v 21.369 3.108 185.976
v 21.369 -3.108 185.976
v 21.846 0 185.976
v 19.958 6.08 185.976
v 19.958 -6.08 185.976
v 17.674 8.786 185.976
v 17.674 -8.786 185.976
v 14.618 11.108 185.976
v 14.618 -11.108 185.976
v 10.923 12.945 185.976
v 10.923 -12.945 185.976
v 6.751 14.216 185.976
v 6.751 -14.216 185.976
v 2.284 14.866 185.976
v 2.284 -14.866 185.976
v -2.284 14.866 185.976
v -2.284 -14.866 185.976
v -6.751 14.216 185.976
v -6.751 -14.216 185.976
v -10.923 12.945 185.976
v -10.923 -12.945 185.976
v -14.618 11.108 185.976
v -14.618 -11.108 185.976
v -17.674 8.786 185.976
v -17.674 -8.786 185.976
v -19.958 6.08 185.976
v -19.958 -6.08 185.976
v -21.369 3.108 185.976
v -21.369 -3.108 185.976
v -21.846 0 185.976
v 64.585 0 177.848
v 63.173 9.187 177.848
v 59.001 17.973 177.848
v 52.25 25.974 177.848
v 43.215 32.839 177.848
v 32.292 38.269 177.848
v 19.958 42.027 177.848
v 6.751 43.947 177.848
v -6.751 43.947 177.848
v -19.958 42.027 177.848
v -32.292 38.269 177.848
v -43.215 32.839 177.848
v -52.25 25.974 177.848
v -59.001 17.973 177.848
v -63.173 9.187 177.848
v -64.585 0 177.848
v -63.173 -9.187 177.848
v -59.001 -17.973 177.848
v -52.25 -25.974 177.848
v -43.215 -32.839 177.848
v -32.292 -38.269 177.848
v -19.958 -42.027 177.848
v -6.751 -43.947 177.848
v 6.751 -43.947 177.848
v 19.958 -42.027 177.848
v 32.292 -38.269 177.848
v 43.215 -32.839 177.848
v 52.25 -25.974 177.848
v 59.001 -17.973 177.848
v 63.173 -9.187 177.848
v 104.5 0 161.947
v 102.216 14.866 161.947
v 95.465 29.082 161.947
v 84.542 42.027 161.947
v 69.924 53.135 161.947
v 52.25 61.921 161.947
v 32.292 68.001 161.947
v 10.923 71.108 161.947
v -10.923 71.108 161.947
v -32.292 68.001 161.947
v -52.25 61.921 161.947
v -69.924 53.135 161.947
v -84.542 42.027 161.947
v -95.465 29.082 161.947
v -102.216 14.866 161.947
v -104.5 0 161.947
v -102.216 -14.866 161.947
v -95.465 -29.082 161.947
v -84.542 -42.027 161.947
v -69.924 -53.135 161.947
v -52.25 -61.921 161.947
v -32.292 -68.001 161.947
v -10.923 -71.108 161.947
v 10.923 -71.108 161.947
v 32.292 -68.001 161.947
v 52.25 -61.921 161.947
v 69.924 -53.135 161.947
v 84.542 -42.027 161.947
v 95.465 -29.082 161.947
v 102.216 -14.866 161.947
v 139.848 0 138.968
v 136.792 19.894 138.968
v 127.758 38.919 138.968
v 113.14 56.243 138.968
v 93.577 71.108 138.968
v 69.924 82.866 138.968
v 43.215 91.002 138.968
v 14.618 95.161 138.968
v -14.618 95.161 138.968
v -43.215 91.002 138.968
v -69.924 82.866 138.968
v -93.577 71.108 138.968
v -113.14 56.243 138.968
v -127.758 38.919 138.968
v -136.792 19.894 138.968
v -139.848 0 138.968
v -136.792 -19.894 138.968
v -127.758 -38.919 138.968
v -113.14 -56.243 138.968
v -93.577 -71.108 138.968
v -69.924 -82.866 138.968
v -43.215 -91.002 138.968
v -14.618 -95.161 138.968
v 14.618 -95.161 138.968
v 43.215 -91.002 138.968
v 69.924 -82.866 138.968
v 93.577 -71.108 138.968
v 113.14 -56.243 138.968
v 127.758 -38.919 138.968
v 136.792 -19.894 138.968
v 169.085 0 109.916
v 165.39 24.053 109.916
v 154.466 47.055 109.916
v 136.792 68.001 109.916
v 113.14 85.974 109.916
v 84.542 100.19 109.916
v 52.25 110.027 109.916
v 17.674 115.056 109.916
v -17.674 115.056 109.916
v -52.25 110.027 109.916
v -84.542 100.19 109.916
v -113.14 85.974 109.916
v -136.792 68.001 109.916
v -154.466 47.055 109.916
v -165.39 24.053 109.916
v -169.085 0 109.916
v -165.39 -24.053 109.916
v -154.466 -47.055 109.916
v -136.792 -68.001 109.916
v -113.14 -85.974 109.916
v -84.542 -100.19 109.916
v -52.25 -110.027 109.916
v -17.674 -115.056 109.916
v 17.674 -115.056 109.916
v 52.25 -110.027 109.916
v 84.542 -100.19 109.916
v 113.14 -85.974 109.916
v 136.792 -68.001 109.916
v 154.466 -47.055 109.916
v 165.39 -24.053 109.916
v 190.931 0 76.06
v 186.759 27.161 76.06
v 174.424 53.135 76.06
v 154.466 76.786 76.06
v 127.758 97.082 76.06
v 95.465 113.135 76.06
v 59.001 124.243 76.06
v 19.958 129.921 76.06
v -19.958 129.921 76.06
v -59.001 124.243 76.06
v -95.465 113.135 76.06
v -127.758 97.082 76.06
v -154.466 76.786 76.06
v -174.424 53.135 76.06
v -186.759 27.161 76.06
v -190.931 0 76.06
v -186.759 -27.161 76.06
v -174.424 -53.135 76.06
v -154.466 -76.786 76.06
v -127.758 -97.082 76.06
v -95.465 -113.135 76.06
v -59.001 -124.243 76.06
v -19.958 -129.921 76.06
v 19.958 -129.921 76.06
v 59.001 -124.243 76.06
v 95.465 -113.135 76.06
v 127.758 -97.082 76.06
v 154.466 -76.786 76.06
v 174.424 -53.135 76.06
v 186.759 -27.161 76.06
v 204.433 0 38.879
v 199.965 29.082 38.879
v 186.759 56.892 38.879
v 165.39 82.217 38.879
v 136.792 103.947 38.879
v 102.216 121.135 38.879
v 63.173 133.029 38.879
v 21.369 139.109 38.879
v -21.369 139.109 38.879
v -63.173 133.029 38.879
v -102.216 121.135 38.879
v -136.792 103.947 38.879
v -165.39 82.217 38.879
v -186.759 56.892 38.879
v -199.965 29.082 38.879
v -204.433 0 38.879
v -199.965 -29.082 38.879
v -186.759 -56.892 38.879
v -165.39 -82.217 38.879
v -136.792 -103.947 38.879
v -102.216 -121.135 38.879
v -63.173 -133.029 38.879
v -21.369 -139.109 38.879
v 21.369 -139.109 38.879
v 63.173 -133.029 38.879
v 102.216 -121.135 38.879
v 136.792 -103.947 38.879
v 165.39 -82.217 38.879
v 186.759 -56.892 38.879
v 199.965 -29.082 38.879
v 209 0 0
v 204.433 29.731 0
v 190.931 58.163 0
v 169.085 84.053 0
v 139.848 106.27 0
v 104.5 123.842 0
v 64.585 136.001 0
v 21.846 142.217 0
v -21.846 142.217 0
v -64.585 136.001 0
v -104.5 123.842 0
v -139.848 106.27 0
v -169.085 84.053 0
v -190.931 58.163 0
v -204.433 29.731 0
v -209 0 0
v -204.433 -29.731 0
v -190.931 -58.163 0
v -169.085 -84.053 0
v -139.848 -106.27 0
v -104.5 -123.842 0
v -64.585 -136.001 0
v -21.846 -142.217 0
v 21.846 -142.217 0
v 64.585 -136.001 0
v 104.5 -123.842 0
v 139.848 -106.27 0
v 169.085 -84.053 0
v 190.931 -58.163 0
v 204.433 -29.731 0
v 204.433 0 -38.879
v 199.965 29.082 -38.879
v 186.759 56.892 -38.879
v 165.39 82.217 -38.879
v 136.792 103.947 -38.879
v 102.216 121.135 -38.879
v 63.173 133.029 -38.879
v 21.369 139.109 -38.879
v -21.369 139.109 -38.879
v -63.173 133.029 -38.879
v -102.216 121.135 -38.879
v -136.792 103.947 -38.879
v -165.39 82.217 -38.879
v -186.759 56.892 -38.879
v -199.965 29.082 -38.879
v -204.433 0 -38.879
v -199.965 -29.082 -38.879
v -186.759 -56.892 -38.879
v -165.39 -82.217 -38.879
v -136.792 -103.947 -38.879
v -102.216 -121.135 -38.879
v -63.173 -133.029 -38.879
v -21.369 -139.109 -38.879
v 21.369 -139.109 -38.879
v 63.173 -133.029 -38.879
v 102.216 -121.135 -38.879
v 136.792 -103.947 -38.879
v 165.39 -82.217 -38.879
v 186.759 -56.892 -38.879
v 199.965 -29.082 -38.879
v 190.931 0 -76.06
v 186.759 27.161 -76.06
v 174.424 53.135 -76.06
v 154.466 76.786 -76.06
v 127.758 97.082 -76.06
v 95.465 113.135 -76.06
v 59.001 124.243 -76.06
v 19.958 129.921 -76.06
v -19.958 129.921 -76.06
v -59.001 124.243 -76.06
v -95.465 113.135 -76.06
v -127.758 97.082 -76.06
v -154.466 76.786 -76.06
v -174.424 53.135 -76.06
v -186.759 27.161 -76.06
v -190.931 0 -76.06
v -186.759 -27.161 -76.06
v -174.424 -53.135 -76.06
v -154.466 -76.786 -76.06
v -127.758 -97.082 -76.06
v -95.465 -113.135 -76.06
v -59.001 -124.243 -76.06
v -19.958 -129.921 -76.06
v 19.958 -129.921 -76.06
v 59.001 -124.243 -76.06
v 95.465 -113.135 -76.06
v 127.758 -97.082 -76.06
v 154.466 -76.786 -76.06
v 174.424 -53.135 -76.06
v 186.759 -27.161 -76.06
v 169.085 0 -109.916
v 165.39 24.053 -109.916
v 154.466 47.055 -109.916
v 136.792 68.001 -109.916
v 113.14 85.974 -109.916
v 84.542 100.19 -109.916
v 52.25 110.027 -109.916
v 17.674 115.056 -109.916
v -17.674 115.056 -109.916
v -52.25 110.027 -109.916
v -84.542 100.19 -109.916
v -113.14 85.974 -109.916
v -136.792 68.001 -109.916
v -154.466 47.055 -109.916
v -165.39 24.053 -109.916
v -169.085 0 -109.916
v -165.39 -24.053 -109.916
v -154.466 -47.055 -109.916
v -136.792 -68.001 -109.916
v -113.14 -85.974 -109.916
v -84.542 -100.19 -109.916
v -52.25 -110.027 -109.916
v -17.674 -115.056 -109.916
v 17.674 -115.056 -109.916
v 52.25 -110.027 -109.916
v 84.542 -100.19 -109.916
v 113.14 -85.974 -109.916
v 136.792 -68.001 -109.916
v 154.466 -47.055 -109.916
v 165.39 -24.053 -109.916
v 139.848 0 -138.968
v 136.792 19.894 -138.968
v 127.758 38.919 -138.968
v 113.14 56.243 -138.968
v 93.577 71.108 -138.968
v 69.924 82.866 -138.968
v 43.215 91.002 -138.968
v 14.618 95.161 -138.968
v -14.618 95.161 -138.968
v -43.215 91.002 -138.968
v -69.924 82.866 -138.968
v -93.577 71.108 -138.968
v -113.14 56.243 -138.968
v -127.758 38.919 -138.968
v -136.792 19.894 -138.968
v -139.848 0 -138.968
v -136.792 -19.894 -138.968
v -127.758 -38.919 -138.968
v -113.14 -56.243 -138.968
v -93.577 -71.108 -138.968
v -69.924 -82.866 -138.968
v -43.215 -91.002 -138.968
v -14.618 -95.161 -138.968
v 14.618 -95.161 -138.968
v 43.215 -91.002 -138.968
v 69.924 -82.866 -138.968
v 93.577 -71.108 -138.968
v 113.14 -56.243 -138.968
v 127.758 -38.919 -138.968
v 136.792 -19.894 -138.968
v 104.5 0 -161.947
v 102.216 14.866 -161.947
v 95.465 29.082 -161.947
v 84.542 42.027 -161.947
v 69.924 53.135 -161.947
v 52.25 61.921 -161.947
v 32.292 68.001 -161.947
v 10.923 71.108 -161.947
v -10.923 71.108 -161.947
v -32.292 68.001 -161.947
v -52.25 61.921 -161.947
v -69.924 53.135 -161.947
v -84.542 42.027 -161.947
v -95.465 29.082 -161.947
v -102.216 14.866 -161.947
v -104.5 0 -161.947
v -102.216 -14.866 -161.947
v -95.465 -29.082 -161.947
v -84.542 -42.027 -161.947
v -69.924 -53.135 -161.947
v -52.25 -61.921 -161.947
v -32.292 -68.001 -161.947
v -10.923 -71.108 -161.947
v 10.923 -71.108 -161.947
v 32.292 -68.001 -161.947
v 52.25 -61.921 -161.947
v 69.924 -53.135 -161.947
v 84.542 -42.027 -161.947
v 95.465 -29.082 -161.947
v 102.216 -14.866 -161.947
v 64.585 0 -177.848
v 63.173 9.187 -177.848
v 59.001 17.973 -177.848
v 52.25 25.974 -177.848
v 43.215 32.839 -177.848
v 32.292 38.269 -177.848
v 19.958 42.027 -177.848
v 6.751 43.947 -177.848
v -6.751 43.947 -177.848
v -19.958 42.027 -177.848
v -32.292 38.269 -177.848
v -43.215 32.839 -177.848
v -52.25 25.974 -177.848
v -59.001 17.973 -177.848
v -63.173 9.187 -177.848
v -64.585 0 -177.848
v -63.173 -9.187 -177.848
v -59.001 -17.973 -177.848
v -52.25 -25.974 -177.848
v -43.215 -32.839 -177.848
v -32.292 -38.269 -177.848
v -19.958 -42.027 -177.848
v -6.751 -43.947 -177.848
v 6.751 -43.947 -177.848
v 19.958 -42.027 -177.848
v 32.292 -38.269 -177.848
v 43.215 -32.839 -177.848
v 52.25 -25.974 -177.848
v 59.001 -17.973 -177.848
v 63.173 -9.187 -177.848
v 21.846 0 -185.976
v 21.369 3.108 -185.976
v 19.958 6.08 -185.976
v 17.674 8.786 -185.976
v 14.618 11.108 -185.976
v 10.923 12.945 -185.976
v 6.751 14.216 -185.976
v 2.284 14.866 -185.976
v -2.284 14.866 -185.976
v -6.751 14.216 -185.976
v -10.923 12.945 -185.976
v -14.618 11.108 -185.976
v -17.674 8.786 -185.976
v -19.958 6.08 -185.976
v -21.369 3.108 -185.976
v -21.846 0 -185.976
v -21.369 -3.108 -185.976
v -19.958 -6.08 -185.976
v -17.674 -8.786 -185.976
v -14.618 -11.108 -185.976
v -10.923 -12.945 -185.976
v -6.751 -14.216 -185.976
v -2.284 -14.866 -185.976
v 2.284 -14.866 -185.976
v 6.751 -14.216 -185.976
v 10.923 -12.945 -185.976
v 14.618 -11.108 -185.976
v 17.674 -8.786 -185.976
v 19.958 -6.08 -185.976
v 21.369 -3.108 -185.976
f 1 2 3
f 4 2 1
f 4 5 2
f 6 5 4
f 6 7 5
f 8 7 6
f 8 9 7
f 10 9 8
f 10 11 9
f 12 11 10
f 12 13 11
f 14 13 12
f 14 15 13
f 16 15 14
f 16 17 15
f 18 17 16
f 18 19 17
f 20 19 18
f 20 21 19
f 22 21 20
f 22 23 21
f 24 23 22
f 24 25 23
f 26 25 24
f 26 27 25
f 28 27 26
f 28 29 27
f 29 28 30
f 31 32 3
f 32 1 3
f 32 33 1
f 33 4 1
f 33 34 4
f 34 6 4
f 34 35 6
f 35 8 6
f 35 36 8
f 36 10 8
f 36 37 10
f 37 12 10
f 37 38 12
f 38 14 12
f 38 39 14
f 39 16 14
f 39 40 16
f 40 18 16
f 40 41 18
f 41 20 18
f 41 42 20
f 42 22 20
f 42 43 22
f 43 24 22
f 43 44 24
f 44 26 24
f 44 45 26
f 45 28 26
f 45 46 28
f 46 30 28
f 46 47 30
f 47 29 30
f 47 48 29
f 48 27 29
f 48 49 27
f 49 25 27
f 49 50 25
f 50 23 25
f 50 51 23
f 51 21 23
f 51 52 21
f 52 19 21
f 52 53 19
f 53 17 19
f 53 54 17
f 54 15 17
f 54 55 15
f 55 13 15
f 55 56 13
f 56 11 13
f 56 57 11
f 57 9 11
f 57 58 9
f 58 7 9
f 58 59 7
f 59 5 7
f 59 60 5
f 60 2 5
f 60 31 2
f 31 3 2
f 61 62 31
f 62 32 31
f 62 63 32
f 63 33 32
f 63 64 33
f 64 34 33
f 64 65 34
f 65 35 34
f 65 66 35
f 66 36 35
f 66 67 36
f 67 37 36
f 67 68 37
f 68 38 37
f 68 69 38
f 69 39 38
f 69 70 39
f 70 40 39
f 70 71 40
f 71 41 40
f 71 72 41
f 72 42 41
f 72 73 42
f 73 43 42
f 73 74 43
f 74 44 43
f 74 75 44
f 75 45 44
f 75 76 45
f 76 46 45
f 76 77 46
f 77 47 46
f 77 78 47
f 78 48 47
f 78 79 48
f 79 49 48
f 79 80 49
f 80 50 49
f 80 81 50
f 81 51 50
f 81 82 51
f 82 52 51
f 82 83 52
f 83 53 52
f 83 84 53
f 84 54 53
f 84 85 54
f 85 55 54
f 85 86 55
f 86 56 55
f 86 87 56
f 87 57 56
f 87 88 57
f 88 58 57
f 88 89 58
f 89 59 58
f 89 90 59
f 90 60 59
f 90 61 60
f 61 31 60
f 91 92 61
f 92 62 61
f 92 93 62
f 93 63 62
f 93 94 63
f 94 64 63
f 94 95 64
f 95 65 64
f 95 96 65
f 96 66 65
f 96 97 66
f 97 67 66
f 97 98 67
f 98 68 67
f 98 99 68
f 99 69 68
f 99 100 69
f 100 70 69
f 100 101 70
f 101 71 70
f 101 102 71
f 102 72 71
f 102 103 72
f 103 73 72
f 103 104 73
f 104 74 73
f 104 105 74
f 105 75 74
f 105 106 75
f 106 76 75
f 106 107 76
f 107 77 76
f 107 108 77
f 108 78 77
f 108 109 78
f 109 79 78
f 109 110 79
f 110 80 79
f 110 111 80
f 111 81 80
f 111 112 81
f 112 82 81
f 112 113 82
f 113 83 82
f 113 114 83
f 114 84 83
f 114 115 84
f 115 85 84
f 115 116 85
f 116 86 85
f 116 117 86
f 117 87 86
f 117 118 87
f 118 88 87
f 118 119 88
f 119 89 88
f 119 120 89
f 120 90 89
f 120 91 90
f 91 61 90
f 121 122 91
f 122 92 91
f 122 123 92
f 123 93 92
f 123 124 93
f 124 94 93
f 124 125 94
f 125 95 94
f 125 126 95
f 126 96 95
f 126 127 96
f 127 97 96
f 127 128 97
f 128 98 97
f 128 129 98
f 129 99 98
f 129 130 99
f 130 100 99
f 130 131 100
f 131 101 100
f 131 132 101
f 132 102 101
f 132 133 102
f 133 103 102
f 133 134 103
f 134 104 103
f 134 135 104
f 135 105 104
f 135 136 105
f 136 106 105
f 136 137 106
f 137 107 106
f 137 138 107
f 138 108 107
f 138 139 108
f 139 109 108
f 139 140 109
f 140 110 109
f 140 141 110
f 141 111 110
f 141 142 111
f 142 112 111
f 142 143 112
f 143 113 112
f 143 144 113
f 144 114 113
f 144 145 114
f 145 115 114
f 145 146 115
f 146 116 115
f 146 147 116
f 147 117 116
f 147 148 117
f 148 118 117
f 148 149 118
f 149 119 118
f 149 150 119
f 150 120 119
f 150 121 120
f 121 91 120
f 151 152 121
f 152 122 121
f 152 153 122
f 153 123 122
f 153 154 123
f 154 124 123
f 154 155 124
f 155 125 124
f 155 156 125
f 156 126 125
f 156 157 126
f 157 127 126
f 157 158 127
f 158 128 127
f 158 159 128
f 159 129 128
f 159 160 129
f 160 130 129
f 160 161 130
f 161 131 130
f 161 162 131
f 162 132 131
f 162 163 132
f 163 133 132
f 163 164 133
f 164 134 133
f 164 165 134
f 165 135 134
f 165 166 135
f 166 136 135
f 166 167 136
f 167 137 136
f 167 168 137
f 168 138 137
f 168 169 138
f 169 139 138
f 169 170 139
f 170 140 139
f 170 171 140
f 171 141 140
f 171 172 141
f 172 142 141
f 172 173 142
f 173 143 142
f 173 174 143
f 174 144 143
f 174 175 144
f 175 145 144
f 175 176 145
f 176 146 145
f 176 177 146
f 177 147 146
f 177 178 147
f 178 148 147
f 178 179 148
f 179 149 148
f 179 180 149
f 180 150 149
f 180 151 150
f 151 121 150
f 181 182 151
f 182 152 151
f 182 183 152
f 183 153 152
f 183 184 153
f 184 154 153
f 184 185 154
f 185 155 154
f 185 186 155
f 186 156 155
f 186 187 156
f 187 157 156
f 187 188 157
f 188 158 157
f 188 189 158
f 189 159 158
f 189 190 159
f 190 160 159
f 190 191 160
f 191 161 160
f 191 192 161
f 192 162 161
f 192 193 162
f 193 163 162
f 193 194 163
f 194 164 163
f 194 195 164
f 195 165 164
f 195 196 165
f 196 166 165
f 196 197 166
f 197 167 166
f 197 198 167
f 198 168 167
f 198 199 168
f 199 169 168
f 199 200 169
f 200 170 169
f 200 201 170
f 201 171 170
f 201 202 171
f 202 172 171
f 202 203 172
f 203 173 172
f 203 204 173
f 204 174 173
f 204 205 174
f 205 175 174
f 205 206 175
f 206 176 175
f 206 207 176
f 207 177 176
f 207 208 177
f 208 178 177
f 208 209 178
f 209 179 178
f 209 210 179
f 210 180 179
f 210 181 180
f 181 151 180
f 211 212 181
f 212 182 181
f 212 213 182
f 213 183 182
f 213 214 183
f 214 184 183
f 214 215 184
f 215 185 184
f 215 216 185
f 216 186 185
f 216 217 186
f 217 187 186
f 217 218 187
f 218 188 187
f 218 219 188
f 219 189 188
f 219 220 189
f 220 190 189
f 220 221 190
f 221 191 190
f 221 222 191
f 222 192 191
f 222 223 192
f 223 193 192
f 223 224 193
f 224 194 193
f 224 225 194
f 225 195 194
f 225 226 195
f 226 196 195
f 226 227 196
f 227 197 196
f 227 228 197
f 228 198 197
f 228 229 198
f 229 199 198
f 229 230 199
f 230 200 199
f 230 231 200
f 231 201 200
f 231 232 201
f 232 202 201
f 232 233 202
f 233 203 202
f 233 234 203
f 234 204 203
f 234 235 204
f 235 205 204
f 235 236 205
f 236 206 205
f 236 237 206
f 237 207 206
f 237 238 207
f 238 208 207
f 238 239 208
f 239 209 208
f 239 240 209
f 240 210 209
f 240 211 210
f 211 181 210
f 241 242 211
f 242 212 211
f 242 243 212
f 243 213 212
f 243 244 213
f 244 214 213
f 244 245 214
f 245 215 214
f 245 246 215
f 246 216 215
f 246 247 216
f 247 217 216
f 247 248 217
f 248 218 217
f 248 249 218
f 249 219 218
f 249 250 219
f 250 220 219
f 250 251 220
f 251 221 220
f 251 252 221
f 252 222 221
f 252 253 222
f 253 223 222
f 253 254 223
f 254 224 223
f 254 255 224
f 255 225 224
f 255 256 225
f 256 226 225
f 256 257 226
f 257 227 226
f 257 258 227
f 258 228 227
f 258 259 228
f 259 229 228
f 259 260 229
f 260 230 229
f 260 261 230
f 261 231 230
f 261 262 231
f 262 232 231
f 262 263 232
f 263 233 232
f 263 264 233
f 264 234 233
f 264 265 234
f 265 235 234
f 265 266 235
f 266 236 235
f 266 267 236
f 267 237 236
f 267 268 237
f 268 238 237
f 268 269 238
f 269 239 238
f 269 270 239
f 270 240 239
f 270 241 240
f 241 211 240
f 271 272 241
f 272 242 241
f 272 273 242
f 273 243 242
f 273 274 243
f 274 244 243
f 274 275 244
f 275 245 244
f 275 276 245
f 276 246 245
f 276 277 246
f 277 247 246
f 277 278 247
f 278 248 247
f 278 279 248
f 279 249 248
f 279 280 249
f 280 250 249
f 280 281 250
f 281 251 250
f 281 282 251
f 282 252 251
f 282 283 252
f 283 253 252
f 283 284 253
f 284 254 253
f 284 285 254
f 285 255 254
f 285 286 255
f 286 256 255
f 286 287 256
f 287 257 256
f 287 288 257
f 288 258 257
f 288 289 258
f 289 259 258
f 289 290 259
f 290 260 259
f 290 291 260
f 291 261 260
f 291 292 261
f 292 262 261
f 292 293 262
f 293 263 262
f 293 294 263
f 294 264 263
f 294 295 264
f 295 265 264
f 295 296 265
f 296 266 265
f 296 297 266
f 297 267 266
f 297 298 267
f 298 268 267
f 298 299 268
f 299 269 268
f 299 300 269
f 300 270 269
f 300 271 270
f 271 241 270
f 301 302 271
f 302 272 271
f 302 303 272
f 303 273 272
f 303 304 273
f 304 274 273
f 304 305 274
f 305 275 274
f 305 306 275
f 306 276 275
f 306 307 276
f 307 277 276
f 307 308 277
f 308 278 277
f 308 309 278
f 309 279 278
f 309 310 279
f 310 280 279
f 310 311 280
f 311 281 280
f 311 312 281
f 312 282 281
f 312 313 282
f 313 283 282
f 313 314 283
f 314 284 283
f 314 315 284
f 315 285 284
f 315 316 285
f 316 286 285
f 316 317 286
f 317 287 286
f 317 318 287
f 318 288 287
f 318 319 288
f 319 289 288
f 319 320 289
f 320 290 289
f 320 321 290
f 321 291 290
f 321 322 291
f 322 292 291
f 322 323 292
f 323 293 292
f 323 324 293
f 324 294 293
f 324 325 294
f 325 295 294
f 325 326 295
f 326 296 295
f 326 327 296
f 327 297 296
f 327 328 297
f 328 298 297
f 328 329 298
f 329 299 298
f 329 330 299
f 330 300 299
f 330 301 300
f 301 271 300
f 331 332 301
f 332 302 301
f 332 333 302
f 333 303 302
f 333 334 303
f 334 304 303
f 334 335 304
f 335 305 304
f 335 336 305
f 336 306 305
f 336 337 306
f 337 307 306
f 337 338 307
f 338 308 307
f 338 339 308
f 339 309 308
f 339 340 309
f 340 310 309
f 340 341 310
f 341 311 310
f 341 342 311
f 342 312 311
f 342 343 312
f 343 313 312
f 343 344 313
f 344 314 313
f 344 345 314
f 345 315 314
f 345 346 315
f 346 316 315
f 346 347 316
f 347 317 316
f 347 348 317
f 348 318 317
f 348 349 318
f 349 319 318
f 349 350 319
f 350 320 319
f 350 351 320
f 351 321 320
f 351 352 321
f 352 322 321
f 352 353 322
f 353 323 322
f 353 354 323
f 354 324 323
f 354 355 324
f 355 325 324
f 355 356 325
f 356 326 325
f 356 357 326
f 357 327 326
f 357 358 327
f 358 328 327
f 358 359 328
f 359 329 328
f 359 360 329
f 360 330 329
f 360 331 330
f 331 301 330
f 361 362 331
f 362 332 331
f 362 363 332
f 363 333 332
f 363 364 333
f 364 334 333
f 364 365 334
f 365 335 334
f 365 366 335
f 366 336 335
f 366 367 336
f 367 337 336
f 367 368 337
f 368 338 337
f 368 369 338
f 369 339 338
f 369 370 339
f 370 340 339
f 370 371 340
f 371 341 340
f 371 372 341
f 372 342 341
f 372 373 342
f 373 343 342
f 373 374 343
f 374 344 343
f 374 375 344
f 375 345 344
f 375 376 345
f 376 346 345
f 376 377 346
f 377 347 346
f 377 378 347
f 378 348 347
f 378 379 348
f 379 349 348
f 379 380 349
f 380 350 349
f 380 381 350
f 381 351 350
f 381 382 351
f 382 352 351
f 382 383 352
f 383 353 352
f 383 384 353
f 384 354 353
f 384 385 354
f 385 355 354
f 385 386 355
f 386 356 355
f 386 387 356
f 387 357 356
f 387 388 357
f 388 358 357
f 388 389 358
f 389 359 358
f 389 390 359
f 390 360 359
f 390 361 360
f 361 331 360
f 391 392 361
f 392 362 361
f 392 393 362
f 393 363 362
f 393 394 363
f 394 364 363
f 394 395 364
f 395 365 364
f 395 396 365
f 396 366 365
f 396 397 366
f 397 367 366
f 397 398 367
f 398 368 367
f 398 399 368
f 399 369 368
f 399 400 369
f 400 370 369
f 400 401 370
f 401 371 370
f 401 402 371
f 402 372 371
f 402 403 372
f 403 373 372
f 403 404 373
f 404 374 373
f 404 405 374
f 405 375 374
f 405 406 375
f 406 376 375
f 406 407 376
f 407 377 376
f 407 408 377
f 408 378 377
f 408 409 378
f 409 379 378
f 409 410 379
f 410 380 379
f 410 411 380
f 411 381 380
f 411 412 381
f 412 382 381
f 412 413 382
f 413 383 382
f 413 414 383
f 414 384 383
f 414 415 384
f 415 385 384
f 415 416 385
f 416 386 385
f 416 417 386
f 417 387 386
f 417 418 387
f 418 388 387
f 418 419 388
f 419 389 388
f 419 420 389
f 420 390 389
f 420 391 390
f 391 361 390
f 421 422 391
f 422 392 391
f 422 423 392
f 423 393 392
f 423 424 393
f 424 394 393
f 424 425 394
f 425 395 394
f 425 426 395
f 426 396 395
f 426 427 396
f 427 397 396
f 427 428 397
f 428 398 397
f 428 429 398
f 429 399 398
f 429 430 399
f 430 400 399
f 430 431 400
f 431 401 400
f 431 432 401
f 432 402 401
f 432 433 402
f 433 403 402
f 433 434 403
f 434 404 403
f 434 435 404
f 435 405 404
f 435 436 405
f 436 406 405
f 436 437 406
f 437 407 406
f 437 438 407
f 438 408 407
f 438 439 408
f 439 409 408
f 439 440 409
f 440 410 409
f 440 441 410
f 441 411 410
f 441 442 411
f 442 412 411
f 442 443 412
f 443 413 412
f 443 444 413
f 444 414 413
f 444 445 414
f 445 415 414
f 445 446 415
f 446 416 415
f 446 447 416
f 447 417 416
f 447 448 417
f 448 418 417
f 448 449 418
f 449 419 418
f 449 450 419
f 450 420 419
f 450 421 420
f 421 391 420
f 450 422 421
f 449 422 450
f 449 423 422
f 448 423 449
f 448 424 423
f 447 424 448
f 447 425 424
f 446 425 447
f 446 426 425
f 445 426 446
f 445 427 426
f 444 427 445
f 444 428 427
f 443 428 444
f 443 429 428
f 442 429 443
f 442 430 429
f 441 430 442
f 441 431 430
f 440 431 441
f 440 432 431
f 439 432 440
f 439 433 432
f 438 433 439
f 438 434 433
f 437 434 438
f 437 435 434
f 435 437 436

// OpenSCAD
// Generated by SolidPython 1.0.1 on 2020-07-29 00:46:54


scale(v = [19, 13, 17]) {
	sphere(r = 11);
}
/***********************************************
*********      SolidPython code:      **********
************************************************
 
# import packages: SolidPython
from solid import *
from solid.utils import *
from itertools import chain, combinations, permutations


class Resize:

    def __init__(self, scad_file):
        self.scad_file = scad_file
        #self.scad_file = import_scad(scad_file)
        # cone/cylinder param:
        self.r1 = 0
        self.r2 = 0
        self.h = 0
        # rectangular prism param:
        self.w = 0
        self.l = 0
        # ellipse param:
        self.r = 0

    # import OpenScad code (file name corresponds to shape)


    # classify shape + parameters
    def assign(self, param1, param2, param3):
        if self.scad_file == 'cone.scad':
            self.r1 = param1
            self.r2 = param2
            self.h = param3
        elif self.scad_file == 'cylinder.scad':
            self.r1 = param1
            self.r2 = param2
            self.h = param3
        elif self.scad_file == 'rectangularPrism.scad':
            self.h = param1
            self.l = param2
            self.w = param3
        else:
            self.r = param1
            self.h = param2

    # resize parameters
    def iterate(self):
        x = range(3, 20, 2)
        i = 1
        if self.scad_file == 'cone.scad':
            tempList = list(permutations(x, 2))
            for temp in tempList:
                param1 = temp[0]
                param2 = temp[1]
                filepath = 'produced_scad_files/' + 'cone' + str(param1) + '_' + str(param2) + '_' + '.scad'
                scad_render_to_file(cylinder(h=param1, r1=param2, r2=0), filepath)

        elif self.scad_file == 'cylinder.scad':
            tempList = list(permutations(x, 3))
            for temp in tempList:
                param1 = temp[0]
                param2 = temp[1]
                filepath = 'produced_scad_files/' + 'cylinder' + str(param1) + '_' + str(param2) + '_' + '.scad'
                scad_render_to_file(cylinder(h=param1, r1=param2, r2=param2), filepath)

        elif self.scad_file == 'rectangularPrism.scad':
            tempList = list(permutations(x, 3))
            for temp in tempList:
                param1 = temp[0]
                param2 = temp[1]
                param3 = temp[2]
                filepath = 'produced_scad_files/' + 'rectangularPrism' + str(param1) + '_' + str(param2) + '_' + str(
                    param3) + '.scad'
                scad_render_to_file(cube(size=(param1, param2, param3)), filepath)

        elif self.scad_file == 'ellipse.scad':
            tempList = list(permutations(x, 4))
            for temp in tempList:
                param1 = temp[0]
                param2 = temp[1]
                param3 = temp[2]
                param4 = temp[3]
                filepath = 'produced_scad_files/' + 'ellipse' + str(param1) + '_' + str(param2) + '_' + str(param3) + '_' + str(param4) + '.scad'
                scad_render_to_file(scale([param1, param2, param3])(sphere(r=param4)), filepath)

    def render_to_scadfile(self):
        scad_render_to_file(scad, 'example.scad') 
 
************************************************/
